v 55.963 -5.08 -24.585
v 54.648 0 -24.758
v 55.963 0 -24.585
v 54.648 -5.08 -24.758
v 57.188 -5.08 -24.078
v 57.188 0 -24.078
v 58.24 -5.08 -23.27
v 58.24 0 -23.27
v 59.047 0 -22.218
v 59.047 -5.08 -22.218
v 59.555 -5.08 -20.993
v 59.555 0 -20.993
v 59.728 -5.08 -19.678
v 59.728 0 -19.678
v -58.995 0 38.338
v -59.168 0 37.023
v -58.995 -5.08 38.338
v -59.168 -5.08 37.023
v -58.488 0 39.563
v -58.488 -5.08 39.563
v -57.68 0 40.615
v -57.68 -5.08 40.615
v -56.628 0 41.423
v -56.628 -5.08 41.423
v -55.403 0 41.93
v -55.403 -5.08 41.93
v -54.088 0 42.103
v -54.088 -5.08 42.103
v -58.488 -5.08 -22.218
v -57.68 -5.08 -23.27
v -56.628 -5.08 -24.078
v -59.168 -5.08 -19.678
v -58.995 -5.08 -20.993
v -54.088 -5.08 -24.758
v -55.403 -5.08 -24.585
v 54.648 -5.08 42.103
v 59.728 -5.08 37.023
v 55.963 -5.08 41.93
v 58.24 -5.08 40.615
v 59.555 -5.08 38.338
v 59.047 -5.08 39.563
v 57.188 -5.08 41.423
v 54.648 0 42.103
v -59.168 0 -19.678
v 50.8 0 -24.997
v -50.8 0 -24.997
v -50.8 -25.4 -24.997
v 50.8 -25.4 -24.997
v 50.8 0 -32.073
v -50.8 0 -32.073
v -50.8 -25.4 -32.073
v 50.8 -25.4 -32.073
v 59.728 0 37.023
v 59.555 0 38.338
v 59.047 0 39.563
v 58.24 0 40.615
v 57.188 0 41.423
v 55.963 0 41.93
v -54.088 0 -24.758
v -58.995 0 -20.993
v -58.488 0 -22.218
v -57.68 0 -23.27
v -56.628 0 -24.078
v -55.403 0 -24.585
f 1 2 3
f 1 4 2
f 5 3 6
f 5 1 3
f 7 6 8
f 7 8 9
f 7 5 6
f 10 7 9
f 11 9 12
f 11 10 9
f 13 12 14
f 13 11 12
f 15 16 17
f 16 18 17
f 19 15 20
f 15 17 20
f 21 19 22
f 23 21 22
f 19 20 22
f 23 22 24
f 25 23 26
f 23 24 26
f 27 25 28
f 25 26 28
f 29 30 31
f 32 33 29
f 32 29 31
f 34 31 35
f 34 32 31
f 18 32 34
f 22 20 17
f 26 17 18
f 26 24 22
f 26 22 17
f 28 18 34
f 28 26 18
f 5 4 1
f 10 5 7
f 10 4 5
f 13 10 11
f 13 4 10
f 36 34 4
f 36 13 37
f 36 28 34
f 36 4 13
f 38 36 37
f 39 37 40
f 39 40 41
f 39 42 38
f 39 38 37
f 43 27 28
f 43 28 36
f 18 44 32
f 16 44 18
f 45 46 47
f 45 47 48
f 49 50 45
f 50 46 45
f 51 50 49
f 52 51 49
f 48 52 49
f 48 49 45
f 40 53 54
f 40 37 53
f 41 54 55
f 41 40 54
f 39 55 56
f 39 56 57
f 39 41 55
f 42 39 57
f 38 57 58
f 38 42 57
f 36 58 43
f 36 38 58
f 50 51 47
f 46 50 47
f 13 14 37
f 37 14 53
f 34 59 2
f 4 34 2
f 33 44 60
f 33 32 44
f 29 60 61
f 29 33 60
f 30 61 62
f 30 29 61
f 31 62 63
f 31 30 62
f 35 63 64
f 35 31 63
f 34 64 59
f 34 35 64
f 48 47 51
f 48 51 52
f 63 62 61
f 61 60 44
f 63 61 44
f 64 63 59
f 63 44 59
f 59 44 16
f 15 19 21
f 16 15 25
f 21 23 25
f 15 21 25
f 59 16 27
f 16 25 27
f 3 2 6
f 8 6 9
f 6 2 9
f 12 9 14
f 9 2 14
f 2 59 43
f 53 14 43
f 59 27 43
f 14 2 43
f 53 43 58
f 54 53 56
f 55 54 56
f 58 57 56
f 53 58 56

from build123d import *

# Parameters (mm, degrees)
F0_W        = 118.8959814608
F0_H        = 66.8615028262
F1_DEPTH    = 5.08
F2_R        = 5.08
F3_W        = 101.6
F3_H        = 7.0752100054
F4_DEPTH    = 25.4
F5_R        = 5.08
F6_T1_DEPTH = 127
F6_T3_DEPTH = 14.6952100054
F6_T5_DEPTH = 33.02
F6_T8_ANGLE = 90
F7_DEPTH    = 25.4


# Not quite as in the source:
# - a fillet or chamfer that OpenCascade refuses, or shapes differently, is made with other operations: its cross-section is extruded or revolved along the edge and cut away or added


with BuildPart() as f1:
    # F0 (on Front) → F1 (new body)
    with BuildSketch(Plane.XZ):
        with Locations((0.2797562629, 8.6724124849)):
            Rectangle(F0_W, F0_H)
    extrude(amount=F1_DEPTH)

    # F2
    f2_edges = [f1.edges().sort_by_distance(p)[0] for p in [
        (59.727747, -2.54, 42.103164),
        (-59.168234, -2.54, 42.103164),
        (-59.168234, -2.54, -24.758339),
        (59.727747, -2.54, -24.758339),
    ]]
    fillet(f2_edges, radius=F2_R)


with BuildPart() as f4:
    # F3 (on Front) → F4 (new body)
    with BuildSketch(Plane.XZ):
        with Locations((0, -28.5350345075)):
            Rectangle(F3_W, F3_H)
    extrude(amount=F4_DEPTH)

    # F5
    f5_edges = [f4.edges().sort_by_distance(p)[0] for p in [
        (0, -25.4, -32.07264),
    ]]
    fillet(f5_edges, radius=F5_R)

    # F6: fillet of radius 5.08 on 3 edges, made by hand

    # F6_s2 → F6_t1 (cut)
    with BuildSketch(Plane.YZ.offset(-63.5)):
        with BuildLine():
            ThreePointArc((-5.08, -32.0726395102), (-1.4878975516, -30.5847419586), (0, -26.9926395102))
            Line((0, -26.9926395102), (0, -32.0726395102))
            Line((0, -32.0726395102), (-5.08, -32.0726395102))
        make_face()
        with BuildLine():
            ThreePointArc((-25.4, -30.0774295048), (-23.9121024484, -26.4853270564), (-20.32, -24.9974295048))
            Line((-20.32, -24.9974295048), (-25.4, -24.9974295048))
            Line((-25.4, -24.9974295048), (-25.4, -30.0774295048))
        make_face()
    extrude(amount=F6_T1_DEPTH, mode=Mode.SUBTRACT)

    # F6_s4 → F6_t3 (cut)
    with BuildSketch(Plane.XY.offset(-26.9926395102)):
        with BuildLine():
            ThreePointArc((-45.72, -25.4), (-49.3121024484, -23.9121024484), (-50.8, -20.32))
            Line((-50.8, -20.32), (-50.8, -25.4))
            Line((-50.8, -25.4), (-45.72, -25.4))
        make_face()
    extrude(amount=F6_T3_DEPTH, mode=Mode.SUBTRACT)

    # F6_s6 → F6_t5 (cut)
    with BuildSketch(Plane.XZ.offset(-12.7)):
        with BuildLine():
            ThreePointArc((-45.72, -32.0726395102), (-49.3121024484, -30.5847419586), (-50.8, -26.9926395102))
            Line((-50.8, -26.9926395102), (-50.8, -32.0726395102))
            Line((-50.8, -32.0726395102), (-45.72, -32.0726395102))
        make_face()
    extrude(amount=F6_T5_DEPTH, mode=Mode.SUBTRACT)

    # F6_s7 → F6_t8 (revolve, cut)
    with BuildSketch(Plane.XZ.offset(20.32)):
        with BuildLine():
            ThreePointArc((-45.72, -32.0726395102), (-49.3121024484, -30.5847419586), (-50.8, -26.9926395102))
            Line((-50.8, -26.9926395102), (-50.8, -32.0726395102))
            Line((-50.8, -32.0726395102), (-45.72, -32.0726395102))
        make_face()
    revolve(axis=Axis((-50.8, -20.32, -26.9926395102), (-1, 0, 0)), revolution_arc=F6_T8_ANGLE, mode=Mode.SUBTRACT)

    # F3 (on Front) → F7 (join)
    with BuildSketch(Plane.XZ):
        with Locations((0, -28.5350345075)):
            Rectangle(F3_W, F3_H)
    extrude(amount=F7_DEPTH)


solid = Compound([f1.part, f4.part])
